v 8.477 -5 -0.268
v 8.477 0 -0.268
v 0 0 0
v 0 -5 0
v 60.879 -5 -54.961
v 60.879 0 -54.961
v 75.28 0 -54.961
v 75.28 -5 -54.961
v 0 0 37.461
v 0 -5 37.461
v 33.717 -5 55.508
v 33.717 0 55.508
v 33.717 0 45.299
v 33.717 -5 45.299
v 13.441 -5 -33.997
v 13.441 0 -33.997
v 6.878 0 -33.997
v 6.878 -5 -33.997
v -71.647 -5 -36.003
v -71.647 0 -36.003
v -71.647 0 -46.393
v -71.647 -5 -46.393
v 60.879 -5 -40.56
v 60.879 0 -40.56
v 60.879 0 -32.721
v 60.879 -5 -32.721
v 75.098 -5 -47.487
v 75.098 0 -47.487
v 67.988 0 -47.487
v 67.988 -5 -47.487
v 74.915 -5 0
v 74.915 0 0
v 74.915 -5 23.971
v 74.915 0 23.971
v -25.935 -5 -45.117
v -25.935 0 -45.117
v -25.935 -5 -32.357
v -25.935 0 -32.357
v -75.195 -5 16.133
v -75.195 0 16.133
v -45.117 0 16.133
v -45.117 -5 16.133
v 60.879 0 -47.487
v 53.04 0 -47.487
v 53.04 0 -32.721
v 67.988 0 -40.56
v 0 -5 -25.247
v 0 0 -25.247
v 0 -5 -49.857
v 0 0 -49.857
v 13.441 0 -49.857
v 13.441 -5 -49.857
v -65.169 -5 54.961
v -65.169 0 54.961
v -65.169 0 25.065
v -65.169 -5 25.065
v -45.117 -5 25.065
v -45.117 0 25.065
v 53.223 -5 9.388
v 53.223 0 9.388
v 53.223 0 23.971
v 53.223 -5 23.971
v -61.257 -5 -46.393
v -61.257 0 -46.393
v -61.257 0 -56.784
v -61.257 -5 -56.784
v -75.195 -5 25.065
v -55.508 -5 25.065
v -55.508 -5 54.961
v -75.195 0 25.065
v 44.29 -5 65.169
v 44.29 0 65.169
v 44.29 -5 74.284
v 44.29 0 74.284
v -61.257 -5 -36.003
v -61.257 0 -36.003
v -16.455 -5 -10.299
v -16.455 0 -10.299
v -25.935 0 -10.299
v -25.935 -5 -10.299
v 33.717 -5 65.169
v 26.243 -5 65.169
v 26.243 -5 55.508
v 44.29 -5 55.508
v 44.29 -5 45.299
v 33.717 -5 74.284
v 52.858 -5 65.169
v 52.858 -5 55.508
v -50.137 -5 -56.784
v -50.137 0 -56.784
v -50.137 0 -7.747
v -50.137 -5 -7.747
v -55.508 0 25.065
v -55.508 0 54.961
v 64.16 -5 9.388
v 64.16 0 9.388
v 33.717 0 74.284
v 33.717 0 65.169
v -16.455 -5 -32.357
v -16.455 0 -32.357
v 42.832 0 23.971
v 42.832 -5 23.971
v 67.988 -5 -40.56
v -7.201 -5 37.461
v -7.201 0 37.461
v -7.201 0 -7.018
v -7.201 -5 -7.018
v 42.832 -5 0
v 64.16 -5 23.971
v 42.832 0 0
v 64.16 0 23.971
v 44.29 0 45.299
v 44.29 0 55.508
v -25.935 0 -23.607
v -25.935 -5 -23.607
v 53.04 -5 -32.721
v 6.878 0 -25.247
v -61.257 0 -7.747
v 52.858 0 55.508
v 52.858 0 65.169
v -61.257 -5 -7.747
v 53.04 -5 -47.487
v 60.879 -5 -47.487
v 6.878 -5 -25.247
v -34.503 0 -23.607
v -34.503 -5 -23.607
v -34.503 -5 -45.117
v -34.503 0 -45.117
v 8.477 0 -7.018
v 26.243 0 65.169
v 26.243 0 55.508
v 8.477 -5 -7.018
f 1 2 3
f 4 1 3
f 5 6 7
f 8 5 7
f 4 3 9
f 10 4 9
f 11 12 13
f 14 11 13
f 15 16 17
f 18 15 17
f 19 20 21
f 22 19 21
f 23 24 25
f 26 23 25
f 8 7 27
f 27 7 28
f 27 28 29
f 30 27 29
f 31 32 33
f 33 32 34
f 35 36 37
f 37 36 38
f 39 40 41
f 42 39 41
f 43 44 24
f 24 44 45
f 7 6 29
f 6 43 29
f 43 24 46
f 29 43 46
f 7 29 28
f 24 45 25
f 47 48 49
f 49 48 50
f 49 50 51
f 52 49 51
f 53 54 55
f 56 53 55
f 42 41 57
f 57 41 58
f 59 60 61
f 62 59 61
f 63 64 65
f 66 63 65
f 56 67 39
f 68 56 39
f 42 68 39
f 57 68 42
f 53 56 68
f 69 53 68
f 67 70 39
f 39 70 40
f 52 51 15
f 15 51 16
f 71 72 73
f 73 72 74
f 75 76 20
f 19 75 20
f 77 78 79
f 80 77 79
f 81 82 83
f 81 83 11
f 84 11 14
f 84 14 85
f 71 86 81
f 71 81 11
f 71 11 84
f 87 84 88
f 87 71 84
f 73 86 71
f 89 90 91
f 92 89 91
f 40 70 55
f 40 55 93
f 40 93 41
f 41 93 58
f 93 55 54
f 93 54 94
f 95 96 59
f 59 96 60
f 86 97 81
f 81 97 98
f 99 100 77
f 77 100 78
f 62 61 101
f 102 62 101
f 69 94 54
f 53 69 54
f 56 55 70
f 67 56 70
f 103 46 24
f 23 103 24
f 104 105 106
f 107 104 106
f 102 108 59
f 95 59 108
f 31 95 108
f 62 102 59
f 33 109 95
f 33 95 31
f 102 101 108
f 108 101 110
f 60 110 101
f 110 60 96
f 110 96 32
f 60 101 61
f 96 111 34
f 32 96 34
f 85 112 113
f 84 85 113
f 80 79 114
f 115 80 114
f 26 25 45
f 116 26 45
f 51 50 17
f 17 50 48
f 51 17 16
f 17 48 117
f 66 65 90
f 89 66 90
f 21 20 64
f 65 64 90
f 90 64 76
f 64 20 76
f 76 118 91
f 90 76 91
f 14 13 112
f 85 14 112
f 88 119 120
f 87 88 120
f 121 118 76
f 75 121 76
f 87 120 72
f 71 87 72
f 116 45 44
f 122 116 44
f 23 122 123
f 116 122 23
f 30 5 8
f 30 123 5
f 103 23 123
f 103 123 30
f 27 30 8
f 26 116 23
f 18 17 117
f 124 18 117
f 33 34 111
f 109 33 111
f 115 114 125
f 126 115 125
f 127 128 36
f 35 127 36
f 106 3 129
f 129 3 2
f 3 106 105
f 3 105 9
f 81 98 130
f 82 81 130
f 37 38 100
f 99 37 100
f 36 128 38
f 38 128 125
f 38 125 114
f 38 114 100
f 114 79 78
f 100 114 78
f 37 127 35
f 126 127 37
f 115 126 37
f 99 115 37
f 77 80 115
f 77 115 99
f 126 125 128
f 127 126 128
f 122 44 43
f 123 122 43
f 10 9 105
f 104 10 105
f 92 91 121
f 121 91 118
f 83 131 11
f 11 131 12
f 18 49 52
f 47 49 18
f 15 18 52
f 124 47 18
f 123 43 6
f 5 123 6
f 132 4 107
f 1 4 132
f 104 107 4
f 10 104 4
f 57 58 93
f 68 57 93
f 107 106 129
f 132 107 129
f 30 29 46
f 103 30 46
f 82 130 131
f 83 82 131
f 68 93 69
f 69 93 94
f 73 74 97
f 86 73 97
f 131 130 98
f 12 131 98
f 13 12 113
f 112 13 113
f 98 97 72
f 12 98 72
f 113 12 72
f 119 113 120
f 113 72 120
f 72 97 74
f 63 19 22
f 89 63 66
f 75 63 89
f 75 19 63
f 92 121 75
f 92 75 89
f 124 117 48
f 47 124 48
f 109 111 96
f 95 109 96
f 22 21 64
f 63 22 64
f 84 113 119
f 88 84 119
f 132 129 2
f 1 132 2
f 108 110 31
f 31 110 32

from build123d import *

# Parameters (mm, degrees)
F1_DEPTH  = 5
F3_DEPTH  = 5
F5_DEPTH  = 5
F7_DEPTH  = 5
F9_DEPTH  = 5
F11_DEPTH = 5
F13_DEPTH = 5
F15_DEPTH = 5


with BuildPart() as f1:
    # F0 (on Front) → F1 (new body)
    with BuildSketch(Plane.XZ):
        Polygon((0, 0), (0, 37.460938), (-7.200521, 37.460938), (-7.200521, -7.018229), (8.476563, -7.018229), (8.476563, -0.267681), align=None)
    extrude(amount=F1_DEPTH)


with BuildPart() as f3:
    # F2 (on Front) → F3 (new body)
    with BuildSketch(Plane.XZ):
        Polygon((-55.507816, 54.96094), (-65.169275, 54.96094), (-65.169275, 25.065109), (-75.195312, 25.065109), (-75.195312, 16.132815), (-45.117192, 16.132815), (-45.117192, 25.065109), (-55.507816, 25.065109), align=None)
    extrude(amount=F3_DEPTH)


with BuildPart() as f5:
    # F4 (on Front) → F5 (new body)
    with BuildSketch(Plane.XZ):
        Polygon((74.915372, 0), (74.915372, 23.971355), (64.160161, 23.971355), (64.160161, 9.388021), (53.222653, 9.388021), (53.222653, 23.971355), (42.832039, 23.971355), (42.832039, 0), align=None)
    extrude(amount=F5_DEPTH)


with BuildPart() as f7:
    # F6 (on Front) → F7 (new body)
    with BuildSketch(Plane.XZ):
        Polygon((-61.256509, -46.393231), (-61.256509, -56.783851), (-50.136723, -56.783851), (-50.136723, -46.393231), (-50.136723, -7.747396), (-61.256509, -7.747396), (-61.256509, -36.002606), (-71.647137, -36.002606), (-71.647137, -46.393231), align=None)
    extrude(amount=F7_DEPTH)


with BuildPart() as f9:
    # F8 (on Front) → F9 (new body)
    with BuildSketch(Plane.XZ):
        Polygon((44.290371, 74.283853), (33.717457, 74.283853), (33.717457, 65.169275), (26.243487, 65.169275), (26.243487, 55.507824), (33.717457, 55.507824), (33.717457, 45.299489), (44.290371, 45.299489), (44.290371, 55.507824), (52.858073, 55.507824), (52.858073, 65.169275), (44.290371, 65.169275), align=None)
    extrude(amount=F9_DEPTH)


with BuildPart() as f11:
    # F10 (on Front) → F11 (new body)
    with BuildSketch(Plane.XZ):
        Polygon((60.878906, -54.96094), (75.279951, -54.96094), (75.097665, -47.486983), (67.988284, -47.486983), (67.988284, -40.559899), (60.878906, -40.559899), (60.878906, -32.721356), (53.040367, -32.721356), (53.040367, -47.486983), (60.878906, -47.486983), align=None)
    extrude(amount=F11_DEPTH)


with BuildPart() as f13:
    # F12 (on Front) → F13 (new body)
    with BuildSketch(Plane.XZ):
        Polygon((0, -25.247397), (0, -33.997394), (0, -49.856775), (13.440759, -49.856775), (13.440759, -33.997394), (6.878257, -33.997394), (6.878257, -25.247397), align=None)
    extrude(amount=F13_DEPTH)


with BuildPart() as f15:
    # F14 (on Front) → F15 (new body)
    with BuildSketch(Plane.XZ):
        Polygon((-16.454682, -10.299478), (-25.934575, -10.299478), (-25.934575, -23.606772), (-34.502815, -23.606772), (-34.502815, -45.117188), (-25.934575, -45.117188), (-25.934575, -32.356773), (-16.454682, -32.356773), align=None)
    extrude(amount=F15_DEPTH)


solid = Compound([f1.part, f3.part, f5.part, f7.part, f9.part, f11.part, f13.part, f15.part])
